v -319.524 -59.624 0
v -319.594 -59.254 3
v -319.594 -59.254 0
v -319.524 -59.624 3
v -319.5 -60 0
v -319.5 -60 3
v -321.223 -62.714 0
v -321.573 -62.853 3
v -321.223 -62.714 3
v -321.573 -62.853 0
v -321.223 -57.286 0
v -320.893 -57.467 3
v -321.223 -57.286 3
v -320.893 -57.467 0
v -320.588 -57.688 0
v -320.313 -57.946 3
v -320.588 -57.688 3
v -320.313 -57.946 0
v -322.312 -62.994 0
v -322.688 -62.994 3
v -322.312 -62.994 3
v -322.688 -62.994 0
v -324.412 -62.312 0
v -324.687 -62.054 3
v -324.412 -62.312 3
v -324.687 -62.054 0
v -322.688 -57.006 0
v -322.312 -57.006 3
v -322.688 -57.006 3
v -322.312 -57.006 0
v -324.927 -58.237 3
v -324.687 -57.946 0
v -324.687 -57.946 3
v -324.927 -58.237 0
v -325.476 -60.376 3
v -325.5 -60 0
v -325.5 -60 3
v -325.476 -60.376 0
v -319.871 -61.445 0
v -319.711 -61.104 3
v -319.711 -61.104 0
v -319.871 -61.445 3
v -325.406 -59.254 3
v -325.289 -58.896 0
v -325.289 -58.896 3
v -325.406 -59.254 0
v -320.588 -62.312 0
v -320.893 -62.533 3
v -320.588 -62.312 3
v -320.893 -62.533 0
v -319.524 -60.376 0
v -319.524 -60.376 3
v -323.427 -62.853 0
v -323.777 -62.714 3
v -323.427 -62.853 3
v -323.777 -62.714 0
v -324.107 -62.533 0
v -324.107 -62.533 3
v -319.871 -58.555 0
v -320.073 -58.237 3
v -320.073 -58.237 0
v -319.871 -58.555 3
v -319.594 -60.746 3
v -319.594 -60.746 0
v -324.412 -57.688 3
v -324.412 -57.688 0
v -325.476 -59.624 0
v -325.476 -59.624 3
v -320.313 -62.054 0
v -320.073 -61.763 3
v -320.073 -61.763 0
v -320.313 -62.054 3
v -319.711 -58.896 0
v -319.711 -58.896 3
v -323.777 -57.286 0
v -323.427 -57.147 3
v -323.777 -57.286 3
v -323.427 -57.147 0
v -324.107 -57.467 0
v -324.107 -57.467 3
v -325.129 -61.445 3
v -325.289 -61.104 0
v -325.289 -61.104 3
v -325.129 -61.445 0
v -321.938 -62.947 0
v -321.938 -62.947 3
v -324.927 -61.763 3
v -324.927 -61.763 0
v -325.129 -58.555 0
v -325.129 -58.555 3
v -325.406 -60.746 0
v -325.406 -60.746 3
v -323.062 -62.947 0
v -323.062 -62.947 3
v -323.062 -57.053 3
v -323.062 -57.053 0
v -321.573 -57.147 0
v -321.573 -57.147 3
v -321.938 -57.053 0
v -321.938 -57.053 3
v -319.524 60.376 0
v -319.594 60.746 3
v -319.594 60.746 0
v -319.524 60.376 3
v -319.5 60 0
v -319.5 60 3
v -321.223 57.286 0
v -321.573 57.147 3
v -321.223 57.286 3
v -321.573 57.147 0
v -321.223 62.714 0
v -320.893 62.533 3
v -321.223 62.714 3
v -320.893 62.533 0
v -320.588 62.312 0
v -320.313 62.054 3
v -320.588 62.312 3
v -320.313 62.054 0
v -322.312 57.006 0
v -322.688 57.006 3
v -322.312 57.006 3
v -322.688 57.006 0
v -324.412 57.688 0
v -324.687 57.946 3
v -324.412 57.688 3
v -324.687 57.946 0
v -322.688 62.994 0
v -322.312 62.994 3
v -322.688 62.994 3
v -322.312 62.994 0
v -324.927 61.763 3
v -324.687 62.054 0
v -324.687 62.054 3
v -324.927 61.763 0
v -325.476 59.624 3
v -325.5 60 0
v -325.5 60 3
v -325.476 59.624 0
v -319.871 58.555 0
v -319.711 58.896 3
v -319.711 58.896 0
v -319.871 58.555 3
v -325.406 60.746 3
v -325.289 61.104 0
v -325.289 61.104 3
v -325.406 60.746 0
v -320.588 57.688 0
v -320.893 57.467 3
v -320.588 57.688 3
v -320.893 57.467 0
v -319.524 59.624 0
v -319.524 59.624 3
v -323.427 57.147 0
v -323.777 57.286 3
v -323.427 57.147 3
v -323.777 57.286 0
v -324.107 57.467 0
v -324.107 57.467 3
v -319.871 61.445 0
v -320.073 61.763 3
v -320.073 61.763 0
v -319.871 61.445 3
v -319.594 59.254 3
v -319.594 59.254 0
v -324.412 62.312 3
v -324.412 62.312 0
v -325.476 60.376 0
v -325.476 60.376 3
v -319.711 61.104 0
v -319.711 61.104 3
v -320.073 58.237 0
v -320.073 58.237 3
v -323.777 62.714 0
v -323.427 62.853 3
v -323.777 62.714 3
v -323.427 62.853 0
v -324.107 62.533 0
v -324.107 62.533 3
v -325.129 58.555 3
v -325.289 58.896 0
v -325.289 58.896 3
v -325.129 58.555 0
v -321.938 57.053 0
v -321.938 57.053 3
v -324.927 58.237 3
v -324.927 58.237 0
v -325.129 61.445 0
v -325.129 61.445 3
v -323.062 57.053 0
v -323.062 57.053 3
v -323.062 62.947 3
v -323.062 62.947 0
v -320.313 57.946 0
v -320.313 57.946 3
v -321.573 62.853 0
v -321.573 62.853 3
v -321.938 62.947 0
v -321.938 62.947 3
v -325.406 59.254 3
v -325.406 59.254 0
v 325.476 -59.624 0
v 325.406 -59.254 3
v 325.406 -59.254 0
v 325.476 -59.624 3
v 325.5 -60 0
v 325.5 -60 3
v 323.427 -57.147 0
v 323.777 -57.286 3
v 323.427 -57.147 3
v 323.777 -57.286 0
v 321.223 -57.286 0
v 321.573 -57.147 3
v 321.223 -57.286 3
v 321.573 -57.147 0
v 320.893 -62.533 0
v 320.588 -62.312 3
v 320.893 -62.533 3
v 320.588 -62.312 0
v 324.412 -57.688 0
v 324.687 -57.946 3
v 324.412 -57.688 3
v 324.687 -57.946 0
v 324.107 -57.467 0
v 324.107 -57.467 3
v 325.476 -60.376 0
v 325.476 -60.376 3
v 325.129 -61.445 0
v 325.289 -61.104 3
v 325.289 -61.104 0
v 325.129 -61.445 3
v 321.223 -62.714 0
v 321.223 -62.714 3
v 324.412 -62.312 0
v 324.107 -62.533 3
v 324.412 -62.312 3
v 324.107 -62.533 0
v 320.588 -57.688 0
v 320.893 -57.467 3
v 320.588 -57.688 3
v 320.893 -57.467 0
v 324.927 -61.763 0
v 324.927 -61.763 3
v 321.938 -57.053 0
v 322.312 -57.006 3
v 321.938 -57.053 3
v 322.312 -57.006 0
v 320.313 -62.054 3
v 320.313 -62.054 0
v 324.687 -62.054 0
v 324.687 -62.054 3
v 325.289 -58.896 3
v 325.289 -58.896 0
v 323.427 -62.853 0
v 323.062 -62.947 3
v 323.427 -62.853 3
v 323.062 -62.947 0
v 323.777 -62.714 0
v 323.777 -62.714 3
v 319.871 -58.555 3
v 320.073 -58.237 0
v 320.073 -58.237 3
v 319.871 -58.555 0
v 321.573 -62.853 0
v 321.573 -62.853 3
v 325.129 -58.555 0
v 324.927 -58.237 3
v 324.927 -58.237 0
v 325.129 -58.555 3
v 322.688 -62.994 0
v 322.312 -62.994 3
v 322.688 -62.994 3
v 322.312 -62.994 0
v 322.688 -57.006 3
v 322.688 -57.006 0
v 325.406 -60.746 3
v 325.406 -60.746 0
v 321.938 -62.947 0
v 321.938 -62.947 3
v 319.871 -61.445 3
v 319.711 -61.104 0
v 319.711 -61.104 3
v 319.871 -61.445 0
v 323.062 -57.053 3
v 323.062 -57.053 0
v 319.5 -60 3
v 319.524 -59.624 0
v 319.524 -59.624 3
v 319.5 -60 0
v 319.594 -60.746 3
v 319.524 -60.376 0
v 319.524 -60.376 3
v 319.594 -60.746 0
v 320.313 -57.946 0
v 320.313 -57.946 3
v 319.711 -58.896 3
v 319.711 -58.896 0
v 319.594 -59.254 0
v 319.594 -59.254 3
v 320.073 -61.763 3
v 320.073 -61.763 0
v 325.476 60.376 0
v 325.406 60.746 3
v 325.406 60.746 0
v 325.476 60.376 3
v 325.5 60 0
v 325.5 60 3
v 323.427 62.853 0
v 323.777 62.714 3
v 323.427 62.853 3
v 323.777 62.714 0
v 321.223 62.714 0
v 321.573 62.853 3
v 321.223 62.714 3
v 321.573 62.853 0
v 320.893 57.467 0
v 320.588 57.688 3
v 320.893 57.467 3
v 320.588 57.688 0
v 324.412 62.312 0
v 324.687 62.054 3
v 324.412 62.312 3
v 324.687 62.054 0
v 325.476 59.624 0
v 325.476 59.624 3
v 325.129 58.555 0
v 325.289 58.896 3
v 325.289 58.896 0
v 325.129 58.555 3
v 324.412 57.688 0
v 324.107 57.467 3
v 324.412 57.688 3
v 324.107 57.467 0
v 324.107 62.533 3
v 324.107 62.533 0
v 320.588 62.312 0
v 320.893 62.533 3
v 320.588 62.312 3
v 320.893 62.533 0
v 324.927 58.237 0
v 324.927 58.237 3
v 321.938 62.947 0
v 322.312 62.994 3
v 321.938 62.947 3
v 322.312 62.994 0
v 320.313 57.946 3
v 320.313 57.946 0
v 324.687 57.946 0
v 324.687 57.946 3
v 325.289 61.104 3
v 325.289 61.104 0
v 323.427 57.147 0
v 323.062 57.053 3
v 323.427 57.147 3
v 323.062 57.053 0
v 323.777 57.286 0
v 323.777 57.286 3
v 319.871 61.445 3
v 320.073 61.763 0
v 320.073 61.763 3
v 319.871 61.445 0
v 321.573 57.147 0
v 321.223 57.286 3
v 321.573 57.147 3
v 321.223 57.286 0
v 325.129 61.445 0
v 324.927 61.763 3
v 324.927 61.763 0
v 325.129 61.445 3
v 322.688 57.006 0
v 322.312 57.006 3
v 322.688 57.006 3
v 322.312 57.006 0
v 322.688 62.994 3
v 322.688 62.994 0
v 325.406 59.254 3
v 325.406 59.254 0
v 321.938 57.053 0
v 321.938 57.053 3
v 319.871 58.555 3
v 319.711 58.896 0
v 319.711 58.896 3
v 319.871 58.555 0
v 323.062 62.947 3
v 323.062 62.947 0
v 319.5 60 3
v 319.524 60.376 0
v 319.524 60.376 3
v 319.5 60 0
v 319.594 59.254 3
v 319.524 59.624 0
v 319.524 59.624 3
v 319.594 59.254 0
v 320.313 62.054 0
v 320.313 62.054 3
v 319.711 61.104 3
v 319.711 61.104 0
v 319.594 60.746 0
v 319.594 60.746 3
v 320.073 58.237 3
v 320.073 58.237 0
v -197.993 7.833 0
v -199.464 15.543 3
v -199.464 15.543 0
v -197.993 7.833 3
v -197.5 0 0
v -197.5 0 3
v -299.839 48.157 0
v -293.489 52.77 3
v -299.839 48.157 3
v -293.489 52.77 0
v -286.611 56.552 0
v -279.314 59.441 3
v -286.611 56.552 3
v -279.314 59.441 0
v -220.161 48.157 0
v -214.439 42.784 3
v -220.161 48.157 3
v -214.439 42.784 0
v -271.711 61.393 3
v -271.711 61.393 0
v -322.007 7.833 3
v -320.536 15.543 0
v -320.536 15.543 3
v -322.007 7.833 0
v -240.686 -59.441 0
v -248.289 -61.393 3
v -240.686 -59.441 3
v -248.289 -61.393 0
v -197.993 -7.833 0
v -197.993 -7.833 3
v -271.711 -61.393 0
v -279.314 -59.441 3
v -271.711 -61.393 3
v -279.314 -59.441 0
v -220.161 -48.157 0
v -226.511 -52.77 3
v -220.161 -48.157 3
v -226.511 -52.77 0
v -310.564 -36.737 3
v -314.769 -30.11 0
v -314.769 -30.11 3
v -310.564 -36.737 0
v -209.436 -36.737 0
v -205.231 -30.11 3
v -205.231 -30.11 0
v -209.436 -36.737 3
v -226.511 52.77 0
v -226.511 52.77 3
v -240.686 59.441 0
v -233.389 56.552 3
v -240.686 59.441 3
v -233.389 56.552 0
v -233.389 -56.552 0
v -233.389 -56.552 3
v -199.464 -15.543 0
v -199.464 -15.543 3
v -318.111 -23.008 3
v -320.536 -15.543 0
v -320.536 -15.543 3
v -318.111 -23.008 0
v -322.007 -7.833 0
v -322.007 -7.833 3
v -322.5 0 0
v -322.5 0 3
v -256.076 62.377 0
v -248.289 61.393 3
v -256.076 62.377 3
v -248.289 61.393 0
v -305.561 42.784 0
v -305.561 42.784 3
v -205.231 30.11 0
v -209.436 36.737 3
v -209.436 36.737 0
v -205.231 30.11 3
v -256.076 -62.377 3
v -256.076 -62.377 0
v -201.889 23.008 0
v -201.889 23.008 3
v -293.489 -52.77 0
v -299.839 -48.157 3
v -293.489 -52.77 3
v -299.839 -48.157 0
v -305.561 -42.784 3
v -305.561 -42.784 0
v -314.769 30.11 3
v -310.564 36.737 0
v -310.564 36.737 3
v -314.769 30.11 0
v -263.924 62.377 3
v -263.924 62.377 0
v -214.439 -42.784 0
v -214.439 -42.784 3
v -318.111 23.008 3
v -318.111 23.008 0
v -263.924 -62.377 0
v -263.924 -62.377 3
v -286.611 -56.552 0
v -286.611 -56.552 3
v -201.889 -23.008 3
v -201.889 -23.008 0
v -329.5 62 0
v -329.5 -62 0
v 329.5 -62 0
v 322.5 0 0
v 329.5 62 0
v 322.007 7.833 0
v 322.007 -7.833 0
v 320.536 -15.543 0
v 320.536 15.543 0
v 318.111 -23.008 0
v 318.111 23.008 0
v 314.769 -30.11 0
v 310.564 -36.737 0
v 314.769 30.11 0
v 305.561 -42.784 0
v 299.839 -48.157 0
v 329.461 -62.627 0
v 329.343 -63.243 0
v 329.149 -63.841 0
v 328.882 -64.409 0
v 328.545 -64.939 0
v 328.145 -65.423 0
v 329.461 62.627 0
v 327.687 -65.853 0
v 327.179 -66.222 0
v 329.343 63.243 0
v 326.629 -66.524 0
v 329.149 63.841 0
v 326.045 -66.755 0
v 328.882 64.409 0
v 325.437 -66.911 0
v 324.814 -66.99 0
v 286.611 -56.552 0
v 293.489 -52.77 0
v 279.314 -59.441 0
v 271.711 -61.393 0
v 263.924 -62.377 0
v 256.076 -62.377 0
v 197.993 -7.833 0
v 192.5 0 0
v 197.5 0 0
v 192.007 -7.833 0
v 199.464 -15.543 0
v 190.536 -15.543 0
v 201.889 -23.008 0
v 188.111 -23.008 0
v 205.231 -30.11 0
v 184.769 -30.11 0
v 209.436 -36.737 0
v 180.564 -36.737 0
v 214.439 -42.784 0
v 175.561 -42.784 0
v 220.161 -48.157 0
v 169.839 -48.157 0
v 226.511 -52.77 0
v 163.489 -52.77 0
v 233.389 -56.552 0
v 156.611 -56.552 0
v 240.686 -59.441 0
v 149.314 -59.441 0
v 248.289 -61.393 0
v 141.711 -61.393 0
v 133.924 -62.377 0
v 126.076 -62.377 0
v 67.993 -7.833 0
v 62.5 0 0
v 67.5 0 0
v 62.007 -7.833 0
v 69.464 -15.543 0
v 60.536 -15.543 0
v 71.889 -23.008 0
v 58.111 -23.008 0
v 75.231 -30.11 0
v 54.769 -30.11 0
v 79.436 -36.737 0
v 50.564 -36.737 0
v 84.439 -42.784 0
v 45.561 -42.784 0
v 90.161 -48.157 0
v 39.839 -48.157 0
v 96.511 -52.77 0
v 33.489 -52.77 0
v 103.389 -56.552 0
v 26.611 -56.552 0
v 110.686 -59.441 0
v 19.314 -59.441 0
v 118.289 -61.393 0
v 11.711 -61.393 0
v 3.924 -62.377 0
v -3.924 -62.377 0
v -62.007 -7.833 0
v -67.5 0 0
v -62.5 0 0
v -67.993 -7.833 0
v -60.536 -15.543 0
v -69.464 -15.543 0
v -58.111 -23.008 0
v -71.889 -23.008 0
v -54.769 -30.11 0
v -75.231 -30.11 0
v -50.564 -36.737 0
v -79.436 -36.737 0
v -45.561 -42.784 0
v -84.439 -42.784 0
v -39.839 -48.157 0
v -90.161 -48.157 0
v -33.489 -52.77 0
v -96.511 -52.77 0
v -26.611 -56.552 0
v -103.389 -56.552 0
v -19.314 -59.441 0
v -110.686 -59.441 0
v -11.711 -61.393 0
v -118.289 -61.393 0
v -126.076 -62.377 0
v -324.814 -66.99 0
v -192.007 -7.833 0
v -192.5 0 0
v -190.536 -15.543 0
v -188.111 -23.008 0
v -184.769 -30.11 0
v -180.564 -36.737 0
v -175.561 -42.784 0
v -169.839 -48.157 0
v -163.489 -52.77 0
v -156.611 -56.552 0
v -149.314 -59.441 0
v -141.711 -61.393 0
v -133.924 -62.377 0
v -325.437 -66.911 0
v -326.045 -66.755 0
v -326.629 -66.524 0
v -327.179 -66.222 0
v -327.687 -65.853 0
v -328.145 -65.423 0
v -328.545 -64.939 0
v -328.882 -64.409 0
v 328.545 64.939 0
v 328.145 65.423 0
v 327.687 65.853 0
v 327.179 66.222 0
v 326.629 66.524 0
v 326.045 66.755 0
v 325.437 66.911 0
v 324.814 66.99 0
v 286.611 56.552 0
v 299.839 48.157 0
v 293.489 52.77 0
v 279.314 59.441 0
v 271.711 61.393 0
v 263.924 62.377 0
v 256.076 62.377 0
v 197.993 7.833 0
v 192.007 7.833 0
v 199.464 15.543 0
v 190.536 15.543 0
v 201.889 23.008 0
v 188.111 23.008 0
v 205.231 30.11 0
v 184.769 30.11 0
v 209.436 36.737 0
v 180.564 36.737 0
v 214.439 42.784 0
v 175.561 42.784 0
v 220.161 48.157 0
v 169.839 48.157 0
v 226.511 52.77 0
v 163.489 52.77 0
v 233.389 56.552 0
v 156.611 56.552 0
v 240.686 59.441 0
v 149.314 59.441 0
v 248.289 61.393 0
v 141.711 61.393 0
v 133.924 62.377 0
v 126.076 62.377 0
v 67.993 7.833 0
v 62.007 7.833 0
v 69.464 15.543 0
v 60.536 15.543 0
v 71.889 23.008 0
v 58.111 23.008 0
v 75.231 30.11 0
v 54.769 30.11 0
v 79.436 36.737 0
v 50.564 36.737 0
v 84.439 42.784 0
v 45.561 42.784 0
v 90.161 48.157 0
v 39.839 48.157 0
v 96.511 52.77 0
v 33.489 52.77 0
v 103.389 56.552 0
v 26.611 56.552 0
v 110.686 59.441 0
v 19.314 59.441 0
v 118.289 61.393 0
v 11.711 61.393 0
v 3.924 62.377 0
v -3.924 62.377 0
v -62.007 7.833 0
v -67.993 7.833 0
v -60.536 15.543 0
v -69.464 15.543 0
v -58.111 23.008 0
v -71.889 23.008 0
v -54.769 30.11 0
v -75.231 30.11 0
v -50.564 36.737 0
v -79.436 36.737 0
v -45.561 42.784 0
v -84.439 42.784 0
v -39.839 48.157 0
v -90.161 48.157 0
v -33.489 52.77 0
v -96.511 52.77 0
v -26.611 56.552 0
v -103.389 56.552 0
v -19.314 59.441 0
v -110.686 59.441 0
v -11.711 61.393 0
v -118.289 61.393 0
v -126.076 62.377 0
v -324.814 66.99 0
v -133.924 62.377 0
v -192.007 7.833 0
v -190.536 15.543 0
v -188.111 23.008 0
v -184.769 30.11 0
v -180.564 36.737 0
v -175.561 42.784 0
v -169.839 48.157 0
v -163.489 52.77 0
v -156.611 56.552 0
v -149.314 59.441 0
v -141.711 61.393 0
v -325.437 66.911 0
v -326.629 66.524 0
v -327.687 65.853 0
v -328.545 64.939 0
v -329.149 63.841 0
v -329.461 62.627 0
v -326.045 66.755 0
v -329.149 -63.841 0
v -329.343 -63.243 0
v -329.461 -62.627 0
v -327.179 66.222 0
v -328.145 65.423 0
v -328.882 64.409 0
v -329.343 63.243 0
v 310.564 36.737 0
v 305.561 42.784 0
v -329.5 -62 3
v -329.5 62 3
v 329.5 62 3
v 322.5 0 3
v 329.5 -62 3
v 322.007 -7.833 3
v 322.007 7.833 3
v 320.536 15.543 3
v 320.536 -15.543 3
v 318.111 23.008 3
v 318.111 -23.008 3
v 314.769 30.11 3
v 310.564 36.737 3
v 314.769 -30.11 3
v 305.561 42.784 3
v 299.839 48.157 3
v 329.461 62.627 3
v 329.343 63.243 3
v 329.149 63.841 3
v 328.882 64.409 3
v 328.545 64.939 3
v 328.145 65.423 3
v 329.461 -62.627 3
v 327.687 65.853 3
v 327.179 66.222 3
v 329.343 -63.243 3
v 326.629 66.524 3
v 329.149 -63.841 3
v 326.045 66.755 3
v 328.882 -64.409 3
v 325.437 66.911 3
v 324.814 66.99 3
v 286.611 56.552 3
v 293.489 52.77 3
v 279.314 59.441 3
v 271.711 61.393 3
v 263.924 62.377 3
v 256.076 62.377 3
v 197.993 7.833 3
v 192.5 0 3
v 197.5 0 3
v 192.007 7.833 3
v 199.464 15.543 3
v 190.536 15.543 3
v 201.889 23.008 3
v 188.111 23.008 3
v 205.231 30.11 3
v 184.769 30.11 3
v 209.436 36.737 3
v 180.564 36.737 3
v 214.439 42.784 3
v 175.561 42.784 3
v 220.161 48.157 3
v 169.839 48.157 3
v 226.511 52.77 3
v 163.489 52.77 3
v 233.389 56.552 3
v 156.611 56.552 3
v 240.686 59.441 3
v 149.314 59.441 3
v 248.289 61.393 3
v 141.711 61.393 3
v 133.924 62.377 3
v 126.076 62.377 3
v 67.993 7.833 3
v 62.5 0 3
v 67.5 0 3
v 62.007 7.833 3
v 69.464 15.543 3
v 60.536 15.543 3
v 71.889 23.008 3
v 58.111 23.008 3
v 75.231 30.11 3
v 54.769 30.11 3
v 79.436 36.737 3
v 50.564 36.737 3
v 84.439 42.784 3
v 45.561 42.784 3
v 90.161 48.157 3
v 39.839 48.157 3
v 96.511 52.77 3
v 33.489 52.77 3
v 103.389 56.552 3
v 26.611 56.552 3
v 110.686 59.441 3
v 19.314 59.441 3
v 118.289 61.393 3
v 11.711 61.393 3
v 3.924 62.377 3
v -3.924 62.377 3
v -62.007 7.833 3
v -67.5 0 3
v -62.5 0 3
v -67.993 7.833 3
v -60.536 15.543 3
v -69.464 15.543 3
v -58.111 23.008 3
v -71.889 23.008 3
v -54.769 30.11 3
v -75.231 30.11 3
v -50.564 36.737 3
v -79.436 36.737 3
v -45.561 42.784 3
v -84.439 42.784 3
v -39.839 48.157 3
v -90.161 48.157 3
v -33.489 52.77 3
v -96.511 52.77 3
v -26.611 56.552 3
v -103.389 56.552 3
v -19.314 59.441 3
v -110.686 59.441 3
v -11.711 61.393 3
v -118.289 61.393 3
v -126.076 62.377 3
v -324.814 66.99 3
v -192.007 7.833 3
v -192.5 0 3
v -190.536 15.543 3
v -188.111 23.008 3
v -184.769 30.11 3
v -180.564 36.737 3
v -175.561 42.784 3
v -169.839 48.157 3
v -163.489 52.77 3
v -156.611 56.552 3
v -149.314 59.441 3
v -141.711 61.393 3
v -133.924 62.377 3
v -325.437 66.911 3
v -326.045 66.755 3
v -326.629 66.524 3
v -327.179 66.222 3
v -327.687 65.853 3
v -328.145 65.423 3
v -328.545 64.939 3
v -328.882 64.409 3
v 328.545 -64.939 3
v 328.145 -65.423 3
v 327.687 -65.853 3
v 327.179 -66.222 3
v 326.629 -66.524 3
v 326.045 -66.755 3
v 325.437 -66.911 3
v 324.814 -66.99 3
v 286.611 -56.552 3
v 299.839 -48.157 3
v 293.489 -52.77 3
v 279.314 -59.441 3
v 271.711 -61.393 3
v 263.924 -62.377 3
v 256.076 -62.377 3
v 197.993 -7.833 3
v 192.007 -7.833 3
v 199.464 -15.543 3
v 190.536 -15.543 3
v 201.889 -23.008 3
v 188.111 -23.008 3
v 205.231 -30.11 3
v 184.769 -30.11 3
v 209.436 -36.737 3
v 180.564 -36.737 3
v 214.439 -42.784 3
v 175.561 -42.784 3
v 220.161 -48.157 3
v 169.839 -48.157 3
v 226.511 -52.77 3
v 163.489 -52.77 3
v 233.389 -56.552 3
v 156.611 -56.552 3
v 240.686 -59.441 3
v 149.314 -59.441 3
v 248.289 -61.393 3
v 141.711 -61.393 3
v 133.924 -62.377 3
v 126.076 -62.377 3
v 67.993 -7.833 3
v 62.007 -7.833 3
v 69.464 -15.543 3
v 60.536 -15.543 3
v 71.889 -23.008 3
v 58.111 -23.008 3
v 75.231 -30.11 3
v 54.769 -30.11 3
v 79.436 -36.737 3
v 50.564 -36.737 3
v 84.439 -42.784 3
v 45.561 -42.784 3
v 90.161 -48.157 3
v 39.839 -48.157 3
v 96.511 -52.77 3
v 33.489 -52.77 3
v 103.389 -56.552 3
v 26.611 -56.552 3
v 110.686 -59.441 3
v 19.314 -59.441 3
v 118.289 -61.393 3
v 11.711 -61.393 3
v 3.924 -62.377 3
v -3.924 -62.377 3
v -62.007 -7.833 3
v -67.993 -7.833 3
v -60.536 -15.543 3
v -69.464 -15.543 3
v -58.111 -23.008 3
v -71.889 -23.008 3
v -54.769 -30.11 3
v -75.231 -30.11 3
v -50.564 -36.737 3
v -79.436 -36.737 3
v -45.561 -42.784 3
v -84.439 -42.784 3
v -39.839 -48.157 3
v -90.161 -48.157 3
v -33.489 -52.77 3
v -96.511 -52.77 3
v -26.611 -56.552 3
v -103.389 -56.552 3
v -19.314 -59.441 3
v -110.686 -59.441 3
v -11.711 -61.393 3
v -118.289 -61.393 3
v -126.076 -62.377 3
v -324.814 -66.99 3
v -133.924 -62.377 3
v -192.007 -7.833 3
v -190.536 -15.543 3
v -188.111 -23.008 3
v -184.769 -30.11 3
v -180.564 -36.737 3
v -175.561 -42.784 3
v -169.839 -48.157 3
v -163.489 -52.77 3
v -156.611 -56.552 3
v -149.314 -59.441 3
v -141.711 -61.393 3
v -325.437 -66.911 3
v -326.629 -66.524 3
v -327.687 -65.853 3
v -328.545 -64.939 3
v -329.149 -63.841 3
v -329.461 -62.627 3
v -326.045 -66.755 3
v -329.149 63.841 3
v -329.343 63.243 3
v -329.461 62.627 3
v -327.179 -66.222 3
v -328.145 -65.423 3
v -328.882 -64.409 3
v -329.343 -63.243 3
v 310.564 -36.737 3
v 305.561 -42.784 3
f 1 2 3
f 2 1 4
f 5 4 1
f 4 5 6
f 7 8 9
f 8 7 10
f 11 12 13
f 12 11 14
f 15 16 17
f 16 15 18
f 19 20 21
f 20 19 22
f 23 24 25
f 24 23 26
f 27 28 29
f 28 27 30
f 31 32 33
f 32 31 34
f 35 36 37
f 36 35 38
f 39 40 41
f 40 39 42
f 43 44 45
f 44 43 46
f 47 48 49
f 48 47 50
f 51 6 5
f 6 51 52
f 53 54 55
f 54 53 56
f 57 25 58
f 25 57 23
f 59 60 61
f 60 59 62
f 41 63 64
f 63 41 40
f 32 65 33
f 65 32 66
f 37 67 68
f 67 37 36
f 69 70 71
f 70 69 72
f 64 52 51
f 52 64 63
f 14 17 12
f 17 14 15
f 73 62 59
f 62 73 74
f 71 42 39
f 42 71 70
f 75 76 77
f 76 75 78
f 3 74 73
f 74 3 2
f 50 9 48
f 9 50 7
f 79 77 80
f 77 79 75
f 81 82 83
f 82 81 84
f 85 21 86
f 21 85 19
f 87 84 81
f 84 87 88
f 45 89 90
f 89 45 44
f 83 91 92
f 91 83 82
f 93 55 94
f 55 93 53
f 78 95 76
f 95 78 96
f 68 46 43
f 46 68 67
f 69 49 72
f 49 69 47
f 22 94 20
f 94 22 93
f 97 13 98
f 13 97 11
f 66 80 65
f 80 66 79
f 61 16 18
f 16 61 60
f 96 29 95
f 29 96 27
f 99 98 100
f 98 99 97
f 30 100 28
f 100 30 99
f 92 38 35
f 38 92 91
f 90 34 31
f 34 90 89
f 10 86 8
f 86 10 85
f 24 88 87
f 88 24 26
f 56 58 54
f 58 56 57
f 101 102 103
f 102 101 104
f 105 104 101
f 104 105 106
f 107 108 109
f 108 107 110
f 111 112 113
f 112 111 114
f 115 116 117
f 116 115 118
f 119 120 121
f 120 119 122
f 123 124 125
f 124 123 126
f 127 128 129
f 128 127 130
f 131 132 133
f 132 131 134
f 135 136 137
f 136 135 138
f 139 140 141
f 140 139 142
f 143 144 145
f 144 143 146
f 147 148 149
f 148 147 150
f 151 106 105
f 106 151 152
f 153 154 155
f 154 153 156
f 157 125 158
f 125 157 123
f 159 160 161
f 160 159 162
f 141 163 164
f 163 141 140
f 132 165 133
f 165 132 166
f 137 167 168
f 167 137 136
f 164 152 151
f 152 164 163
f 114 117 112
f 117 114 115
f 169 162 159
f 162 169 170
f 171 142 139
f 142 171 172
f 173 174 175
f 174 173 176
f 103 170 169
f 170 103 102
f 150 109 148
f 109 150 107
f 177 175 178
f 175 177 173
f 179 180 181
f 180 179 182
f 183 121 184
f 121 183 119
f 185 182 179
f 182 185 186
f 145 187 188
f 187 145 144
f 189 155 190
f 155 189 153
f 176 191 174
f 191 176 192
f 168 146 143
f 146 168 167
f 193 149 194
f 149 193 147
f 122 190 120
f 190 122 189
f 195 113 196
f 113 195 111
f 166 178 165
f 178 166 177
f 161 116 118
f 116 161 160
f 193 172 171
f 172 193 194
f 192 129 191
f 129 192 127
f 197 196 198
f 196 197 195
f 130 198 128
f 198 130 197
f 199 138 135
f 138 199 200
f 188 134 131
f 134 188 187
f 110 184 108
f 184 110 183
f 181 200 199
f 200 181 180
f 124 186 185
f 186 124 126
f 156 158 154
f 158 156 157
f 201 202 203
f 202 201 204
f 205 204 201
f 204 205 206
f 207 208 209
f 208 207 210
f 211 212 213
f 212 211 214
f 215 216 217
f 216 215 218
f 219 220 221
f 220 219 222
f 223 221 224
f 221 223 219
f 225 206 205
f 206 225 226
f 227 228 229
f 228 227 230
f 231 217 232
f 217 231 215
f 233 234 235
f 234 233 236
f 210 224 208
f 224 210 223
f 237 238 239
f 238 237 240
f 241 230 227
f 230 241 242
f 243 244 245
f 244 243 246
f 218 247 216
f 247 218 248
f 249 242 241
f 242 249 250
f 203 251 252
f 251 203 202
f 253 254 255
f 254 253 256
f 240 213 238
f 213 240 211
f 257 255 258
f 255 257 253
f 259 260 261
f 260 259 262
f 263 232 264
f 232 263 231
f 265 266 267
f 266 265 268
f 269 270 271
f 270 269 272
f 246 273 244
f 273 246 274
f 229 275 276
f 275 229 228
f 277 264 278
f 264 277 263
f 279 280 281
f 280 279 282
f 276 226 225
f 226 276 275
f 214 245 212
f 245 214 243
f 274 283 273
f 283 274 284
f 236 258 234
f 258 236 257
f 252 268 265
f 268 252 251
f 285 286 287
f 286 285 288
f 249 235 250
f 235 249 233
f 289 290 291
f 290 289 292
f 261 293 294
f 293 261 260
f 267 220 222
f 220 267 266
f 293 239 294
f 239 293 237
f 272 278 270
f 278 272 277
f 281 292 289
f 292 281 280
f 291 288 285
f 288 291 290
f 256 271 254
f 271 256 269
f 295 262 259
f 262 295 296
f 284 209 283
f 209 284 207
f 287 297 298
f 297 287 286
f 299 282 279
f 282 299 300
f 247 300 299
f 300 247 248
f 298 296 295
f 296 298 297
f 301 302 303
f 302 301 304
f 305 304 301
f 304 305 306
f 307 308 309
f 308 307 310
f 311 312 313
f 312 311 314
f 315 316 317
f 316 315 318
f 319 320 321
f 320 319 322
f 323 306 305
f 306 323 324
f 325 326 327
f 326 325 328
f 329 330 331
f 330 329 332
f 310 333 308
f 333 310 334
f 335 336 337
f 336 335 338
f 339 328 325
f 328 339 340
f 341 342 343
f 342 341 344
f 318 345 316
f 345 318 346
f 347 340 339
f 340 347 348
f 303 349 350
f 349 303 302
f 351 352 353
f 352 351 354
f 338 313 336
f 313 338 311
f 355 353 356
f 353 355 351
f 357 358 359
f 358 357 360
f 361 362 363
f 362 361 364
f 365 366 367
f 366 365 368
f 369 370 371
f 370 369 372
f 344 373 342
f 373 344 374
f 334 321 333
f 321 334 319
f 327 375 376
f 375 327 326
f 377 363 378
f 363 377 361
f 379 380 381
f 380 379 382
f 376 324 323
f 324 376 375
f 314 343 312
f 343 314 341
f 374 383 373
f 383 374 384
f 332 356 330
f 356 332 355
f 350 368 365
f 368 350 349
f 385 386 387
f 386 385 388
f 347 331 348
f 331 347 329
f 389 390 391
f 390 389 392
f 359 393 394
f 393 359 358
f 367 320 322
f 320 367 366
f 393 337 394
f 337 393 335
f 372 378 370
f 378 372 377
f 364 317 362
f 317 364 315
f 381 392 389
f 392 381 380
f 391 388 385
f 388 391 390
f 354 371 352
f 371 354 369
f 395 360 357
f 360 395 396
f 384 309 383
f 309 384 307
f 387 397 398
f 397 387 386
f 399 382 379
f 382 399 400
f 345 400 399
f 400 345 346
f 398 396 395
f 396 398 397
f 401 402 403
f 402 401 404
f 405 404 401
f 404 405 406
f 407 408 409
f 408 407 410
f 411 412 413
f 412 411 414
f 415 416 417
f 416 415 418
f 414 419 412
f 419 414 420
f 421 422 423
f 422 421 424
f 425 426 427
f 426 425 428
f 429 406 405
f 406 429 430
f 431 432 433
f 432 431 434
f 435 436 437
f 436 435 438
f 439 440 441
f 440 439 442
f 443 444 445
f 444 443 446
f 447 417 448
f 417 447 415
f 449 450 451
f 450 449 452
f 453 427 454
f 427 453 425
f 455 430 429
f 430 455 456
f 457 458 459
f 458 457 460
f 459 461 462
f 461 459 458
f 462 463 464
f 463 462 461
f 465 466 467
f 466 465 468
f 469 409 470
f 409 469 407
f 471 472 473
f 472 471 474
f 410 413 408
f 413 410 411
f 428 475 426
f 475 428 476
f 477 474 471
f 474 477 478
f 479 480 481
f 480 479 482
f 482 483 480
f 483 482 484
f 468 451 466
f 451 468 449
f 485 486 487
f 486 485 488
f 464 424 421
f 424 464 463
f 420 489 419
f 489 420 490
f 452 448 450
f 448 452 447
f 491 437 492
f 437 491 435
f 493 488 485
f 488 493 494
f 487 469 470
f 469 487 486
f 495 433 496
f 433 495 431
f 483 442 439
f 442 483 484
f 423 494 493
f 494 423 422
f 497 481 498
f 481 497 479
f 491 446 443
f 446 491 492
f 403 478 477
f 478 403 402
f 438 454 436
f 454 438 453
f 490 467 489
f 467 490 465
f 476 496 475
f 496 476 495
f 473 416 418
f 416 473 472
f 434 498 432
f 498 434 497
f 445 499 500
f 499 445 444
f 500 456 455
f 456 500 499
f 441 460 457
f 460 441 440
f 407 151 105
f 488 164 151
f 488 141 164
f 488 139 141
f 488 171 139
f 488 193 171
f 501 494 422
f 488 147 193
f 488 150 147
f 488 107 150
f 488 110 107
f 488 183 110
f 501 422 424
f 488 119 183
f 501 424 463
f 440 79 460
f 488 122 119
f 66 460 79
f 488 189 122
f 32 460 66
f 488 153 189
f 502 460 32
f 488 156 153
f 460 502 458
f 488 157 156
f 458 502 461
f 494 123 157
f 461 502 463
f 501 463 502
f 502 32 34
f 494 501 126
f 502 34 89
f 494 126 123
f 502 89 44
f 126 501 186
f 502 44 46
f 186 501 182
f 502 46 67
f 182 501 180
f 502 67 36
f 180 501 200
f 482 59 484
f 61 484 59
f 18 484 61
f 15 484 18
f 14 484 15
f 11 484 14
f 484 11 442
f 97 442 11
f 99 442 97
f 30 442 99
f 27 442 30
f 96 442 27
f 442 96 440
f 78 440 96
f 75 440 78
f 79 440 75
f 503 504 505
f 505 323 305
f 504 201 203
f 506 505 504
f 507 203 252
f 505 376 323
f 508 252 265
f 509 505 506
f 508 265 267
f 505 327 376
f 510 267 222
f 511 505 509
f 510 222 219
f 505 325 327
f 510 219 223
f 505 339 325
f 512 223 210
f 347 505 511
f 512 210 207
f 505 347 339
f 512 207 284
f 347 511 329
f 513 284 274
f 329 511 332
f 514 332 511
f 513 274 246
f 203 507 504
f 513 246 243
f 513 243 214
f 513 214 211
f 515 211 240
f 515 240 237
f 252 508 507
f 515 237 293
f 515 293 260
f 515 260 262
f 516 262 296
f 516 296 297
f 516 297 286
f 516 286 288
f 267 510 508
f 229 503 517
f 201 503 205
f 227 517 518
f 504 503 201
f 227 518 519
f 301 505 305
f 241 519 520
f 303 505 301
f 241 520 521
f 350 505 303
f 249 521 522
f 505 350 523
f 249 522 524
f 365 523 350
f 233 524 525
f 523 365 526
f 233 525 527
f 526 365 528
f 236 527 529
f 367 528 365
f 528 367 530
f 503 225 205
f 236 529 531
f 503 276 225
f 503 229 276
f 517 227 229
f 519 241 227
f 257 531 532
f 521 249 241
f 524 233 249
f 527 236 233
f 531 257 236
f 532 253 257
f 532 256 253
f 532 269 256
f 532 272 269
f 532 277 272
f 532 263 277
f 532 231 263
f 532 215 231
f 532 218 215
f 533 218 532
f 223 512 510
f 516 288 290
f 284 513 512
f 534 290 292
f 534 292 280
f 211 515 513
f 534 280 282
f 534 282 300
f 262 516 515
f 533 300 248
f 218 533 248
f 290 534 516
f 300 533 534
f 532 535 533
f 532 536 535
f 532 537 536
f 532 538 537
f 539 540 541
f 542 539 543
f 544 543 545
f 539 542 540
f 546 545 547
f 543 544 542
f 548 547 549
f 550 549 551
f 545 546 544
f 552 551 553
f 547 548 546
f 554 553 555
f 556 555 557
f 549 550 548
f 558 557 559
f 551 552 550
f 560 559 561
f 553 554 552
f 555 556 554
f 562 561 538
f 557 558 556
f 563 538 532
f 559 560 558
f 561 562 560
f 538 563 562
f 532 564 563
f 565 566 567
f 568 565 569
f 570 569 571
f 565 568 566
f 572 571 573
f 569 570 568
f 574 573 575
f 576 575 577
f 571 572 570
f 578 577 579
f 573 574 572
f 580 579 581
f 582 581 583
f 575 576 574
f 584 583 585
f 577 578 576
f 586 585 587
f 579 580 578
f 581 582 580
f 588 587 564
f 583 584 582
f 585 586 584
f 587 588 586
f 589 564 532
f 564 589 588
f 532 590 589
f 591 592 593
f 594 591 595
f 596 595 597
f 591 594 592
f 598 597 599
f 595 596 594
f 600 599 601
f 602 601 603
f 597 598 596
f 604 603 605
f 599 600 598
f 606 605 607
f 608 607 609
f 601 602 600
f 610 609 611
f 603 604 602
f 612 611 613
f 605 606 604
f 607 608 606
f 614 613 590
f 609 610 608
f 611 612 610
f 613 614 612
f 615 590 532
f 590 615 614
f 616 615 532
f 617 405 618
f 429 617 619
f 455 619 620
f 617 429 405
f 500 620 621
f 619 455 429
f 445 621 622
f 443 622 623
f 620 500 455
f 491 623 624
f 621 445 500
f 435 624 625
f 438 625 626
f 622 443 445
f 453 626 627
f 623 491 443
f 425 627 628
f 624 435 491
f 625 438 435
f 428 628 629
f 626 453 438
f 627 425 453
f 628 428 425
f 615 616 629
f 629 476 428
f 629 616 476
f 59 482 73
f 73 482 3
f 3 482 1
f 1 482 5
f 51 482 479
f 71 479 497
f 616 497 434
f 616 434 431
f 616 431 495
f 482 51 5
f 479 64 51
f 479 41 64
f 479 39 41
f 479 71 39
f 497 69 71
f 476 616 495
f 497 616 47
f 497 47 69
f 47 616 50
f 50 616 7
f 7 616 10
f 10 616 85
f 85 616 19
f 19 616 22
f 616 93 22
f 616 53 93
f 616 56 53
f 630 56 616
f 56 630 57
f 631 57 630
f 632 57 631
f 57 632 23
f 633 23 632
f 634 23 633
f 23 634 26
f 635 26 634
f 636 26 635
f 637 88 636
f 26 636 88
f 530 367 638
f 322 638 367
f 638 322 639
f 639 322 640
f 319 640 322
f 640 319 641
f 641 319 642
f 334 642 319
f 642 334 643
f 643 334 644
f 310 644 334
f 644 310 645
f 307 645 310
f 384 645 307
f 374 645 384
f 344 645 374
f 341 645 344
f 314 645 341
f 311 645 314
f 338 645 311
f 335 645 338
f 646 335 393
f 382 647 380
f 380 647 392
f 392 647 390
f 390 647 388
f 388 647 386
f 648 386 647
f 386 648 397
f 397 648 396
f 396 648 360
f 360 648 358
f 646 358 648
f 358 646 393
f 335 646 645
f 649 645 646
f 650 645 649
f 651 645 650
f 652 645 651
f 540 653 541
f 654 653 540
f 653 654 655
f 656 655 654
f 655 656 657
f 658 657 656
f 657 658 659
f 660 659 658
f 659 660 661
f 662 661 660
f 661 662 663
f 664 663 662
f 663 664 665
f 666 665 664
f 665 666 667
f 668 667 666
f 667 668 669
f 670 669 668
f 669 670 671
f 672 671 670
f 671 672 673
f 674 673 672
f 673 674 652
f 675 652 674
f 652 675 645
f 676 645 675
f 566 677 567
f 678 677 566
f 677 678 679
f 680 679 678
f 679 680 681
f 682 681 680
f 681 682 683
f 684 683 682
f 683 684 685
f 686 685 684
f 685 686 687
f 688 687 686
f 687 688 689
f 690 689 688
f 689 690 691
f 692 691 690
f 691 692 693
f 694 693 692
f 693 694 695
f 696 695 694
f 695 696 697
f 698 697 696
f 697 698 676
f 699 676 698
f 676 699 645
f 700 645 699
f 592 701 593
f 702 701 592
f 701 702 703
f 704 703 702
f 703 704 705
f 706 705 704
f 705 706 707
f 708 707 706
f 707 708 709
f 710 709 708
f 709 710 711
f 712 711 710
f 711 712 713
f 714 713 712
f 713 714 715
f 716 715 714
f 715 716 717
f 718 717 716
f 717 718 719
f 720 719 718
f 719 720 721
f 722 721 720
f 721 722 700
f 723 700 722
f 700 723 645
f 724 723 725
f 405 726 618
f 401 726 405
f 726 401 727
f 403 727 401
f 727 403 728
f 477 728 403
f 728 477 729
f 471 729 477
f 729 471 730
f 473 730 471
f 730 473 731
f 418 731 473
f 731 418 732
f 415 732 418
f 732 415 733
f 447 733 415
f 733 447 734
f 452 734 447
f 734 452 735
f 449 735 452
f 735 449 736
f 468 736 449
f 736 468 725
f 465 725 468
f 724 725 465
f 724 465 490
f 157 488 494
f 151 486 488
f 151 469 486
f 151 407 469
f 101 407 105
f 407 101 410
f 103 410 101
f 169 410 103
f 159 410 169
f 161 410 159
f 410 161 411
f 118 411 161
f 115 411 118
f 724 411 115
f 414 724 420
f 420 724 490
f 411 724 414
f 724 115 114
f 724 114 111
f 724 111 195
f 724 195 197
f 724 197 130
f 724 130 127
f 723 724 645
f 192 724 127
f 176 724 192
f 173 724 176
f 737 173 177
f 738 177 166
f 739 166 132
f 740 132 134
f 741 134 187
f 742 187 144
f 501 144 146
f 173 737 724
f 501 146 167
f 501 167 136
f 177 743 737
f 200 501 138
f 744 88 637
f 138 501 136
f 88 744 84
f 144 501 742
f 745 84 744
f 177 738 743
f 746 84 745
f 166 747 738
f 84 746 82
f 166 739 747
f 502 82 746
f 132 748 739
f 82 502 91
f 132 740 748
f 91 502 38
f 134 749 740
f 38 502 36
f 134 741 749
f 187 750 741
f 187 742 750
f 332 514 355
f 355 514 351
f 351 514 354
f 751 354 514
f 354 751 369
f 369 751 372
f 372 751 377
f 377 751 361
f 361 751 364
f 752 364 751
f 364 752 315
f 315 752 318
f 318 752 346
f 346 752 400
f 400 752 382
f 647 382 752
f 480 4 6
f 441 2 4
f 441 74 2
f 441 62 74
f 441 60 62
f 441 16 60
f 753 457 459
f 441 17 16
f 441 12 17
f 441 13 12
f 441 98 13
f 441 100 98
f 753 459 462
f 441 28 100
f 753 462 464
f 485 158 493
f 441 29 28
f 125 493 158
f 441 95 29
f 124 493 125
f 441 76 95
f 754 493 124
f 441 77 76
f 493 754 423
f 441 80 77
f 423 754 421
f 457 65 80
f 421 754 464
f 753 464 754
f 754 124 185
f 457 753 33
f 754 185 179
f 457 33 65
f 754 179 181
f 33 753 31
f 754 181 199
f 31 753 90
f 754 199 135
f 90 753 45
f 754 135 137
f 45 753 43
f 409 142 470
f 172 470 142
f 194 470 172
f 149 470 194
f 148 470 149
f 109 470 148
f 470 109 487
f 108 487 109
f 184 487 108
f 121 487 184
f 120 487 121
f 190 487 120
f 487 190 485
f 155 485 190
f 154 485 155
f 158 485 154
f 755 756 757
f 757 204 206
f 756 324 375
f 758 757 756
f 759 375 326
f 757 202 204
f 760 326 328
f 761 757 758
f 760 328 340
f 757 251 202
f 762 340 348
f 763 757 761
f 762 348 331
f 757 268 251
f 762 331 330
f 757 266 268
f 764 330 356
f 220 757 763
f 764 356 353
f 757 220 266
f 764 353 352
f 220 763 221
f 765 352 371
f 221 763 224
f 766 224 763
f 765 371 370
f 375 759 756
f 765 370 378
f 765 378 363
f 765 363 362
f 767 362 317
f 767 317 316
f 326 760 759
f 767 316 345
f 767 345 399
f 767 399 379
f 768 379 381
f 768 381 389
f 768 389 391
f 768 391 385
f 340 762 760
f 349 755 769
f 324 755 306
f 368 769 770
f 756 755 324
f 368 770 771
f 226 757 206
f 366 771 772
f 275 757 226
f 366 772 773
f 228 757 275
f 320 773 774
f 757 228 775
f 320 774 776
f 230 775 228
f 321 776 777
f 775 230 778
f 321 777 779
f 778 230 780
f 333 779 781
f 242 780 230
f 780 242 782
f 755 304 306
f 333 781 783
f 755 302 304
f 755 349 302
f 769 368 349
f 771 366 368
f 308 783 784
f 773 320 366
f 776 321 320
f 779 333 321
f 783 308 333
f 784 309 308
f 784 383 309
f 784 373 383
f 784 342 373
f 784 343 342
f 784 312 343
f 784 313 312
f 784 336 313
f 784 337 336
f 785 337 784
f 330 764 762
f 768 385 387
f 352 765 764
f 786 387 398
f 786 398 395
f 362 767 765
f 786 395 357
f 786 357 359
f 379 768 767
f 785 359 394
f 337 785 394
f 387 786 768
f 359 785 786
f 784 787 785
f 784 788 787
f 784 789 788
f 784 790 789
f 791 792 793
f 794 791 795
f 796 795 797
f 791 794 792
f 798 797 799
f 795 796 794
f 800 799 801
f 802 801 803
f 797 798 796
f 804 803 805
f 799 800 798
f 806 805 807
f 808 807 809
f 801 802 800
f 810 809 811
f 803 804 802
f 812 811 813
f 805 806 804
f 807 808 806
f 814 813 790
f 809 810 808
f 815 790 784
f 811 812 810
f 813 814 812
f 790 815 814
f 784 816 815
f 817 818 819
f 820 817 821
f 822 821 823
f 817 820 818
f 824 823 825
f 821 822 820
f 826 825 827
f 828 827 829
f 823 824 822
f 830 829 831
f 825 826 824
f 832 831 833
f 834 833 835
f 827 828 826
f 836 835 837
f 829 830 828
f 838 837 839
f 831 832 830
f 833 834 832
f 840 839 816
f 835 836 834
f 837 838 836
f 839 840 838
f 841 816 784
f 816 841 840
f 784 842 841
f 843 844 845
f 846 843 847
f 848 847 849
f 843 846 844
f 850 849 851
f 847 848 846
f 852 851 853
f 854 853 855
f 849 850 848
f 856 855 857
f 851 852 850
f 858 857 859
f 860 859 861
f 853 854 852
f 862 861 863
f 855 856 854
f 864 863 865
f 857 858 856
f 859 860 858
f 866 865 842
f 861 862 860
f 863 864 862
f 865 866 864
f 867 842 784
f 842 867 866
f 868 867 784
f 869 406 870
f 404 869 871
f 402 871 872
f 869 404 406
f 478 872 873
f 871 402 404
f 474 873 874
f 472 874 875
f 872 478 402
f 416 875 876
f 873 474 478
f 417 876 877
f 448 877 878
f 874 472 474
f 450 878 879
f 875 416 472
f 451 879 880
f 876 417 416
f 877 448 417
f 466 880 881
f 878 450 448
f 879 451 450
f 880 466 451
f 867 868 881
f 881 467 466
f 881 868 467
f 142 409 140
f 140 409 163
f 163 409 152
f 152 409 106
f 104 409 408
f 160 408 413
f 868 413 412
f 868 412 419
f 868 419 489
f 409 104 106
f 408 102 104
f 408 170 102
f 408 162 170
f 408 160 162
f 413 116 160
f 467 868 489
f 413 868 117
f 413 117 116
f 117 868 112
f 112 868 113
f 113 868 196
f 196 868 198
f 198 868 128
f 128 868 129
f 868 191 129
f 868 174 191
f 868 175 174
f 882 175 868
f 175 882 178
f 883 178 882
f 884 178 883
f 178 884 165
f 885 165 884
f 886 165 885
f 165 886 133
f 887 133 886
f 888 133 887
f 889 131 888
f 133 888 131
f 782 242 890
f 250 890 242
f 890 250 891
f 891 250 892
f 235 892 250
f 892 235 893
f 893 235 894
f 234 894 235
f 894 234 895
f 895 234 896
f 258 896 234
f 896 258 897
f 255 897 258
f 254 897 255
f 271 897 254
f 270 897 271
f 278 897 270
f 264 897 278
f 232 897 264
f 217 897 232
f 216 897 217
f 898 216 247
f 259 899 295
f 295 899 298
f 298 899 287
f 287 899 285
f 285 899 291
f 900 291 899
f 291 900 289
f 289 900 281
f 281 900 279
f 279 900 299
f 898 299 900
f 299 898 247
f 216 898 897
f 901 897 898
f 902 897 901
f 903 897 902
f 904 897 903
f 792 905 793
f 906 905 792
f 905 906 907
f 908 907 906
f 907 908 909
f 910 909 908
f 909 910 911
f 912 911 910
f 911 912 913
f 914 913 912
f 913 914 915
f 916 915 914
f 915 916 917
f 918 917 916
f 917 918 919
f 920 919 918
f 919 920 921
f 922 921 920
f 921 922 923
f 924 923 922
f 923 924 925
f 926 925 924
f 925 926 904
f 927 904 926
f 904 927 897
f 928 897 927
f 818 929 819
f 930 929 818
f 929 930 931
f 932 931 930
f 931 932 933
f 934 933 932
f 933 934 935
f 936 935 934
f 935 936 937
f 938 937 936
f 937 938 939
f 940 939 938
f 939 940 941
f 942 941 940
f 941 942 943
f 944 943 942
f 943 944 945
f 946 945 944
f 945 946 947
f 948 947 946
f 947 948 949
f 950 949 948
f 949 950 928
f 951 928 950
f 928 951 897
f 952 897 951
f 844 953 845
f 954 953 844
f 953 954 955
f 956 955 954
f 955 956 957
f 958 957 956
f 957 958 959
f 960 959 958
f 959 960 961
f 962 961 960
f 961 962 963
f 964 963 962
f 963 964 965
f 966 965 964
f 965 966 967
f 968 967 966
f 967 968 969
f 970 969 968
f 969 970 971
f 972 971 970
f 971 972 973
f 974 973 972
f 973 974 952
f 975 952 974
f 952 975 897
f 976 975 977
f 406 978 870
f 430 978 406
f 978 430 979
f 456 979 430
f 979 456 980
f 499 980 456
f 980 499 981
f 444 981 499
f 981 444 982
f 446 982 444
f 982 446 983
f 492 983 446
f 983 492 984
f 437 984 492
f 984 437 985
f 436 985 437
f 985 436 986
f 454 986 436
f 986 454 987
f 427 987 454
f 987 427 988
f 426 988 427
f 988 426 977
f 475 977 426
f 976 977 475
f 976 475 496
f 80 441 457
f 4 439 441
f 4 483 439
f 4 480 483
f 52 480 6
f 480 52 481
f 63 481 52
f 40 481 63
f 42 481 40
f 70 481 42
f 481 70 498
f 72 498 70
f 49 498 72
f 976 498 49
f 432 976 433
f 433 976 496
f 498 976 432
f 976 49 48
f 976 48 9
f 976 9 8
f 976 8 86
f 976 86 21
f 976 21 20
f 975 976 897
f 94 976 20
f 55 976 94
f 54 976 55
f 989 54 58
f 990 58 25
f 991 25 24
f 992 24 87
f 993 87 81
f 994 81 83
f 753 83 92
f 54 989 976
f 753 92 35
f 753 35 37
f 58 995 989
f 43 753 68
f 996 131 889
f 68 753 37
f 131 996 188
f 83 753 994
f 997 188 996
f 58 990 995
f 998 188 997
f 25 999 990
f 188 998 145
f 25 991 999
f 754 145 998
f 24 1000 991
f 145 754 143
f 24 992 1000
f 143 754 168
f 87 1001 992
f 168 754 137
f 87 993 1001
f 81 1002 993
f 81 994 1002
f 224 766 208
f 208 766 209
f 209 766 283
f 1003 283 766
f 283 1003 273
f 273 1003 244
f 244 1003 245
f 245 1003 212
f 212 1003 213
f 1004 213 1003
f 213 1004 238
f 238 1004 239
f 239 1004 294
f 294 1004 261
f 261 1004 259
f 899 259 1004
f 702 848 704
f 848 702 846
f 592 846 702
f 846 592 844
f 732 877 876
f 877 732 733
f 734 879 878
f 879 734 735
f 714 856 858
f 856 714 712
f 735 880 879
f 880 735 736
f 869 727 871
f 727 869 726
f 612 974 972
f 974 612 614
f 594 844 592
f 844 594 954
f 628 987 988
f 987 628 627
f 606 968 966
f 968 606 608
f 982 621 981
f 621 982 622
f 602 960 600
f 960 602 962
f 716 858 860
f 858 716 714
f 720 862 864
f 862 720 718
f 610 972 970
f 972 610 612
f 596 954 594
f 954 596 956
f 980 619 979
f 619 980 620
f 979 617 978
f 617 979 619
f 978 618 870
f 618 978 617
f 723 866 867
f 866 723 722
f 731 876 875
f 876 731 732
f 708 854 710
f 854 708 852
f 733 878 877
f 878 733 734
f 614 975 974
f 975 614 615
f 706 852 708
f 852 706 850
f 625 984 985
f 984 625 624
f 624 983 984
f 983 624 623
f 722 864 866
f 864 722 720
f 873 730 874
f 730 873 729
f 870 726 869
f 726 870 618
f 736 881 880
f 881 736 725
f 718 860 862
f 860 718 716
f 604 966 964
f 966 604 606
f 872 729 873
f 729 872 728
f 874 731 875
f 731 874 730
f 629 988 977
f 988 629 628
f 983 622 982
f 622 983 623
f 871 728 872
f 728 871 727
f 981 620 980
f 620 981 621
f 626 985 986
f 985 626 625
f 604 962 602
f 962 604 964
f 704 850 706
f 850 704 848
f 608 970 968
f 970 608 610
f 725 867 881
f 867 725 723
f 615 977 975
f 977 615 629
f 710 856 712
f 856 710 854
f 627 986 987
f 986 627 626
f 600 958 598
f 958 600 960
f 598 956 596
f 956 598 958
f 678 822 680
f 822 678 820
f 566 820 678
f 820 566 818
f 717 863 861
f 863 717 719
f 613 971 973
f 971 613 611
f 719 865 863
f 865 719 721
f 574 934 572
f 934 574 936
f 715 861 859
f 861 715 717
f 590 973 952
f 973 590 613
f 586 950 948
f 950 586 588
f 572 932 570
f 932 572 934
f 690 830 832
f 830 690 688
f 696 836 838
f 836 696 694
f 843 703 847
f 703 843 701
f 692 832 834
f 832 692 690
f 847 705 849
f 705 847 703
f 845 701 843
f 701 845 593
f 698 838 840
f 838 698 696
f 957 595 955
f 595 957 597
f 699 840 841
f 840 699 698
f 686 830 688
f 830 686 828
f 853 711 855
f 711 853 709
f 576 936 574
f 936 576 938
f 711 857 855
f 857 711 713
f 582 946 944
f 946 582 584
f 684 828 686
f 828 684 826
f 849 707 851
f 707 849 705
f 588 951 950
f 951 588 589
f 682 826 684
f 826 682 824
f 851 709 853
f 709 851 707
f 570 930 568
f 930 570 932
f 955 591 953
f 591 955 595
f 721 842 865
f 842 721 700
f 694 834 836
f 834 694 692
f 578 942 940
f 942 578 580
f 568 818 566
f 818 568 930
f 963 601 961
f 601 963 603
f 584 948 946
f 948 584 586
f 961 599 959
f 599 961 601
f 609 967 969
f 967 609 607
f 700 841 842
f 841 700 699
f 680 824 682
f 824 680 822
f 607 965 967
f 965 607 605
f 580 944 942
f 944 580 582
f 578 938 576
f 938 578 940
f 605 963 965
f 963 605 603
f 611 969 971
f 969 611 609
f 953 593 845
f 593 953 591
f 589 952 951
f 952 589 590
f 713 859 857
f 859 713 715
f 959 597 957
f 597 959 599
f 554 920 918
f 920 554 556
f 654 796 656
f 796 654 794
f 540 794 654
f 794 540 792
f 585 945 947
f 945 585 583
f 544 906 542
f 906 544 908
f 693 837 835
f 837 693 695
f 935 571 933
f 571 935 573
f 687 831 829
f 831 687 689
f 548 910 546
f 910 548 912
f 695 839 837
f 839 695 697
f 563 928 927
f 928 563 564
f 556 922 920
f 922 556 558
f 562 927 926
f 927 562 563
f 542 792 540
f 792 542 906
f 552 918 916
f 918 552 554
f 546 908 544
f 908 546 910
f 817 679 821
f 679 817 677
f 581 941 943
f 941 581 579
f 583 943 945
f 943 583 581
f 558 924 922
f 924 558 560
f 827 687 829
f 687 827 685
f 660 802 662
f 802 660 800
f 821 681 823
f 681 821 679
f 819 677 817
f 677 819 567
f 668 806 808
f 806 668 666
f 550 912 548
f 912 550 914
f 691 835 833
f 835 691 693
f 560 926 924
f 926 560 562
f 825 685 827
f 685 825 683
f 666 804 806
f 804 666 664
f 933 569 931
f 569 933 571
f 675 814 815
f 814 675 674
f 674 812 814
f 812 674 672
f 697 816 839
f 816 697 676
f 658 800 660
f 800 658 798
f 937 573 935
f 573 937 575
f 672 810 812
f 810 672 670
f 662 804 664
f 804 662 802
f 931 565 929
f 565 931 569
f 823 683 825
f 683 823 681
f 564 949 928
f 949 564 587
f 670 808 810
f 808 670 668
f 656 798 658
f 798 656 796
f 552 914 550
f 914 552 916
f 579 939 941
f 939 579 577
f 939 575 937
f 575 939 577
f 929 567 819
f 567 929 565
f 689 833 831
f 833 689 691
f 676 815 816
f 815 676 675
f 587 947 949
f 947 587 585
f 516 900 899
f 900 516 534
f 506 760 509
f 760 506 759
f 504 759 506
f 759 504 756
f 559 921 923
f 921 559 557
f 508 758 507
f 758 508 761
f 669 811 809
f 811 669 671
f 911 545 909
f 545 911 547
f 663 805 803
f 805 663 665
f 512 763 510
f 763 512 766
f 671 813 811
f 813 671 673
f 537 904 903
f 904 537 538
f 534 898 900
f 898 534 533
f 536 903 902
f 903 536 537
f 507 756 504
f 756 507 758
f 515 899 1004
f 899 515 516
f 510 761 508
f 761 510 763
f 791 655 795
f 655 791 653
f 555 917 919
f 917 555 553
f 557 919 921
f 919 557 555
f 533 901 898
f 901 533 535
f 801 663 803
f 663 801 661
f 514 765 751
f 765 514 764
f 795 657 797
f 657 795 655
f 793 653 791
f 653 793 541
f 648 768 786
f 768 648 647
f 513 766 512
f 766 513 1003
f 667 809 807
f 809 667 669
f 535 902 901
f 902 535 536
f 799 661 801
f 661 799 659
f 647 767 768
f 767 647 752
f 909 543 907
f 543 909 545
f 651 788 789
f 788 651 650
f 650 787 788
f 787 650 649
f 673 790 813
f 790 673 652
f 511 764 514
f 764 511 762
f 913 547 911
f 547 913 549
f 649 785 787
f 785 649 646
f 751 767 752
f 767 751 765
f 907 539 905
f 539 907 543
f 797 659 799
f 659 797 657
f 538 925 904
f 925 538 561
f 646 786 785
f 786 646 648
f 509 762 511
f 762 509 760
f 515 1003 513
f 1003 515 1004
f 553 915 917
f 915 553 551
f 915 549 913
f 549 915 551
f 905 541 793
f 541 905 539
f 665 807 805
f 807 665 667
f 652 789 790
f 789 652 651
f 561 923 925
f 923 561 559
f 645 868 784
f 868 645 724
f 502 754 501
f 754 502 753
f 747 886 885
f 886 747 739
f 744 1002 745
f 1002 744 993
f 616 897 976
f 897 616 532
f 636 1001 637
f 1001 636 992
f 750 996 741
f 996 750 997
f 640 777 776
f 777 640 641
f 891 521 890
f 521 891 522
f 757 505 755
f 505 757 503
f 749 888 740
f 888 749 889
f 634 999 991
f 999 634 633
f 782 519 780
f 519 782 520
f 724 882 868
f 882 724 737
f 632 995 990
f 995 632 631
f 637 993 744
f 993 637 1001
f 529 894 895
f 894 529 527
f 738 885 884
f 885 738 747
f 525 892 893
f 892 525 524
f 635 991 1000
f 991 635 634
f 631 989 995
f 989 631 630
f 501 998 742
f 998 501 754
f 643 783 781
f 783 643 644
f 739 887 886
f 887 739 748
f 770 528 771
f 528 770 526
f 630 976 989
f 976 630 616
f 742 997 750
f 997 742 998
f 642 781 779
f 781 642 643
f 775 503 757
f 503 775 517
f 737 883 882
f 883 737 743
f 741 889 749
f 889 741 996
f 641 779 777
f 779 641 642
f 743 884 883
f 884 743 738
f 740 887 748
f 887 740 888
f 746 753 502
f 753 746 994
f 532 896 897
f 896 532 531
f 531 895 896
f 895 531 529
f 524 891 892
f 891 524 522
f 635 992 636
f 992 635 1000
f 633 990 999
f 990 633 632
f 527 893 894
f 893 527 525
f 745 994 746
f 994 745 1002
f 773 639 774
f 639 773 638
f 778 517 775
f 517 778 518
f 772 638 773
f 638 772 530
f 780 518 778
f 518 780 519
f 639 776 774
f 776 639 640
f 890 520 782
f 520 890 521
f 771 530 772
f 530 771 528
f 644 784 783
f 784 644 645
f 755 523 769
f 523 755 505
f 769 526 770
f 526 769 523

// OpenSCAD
$fn = 50;


difference() {
	union() {
		hull() {
			translate(v = [-324.5000000000, 62.0000000000, 0]) {
				cylinder(h = 3, r = 5);
			}
			translate(v = [324.5000000000, 62.0000000000, 0]) {
				cylinder(h = 3, r = 5);
			}
			translate(v = [-324.5000000000, -62.0000000000, 0]) {
				cylinder(h = 3, r = 5);
			}
			translate(v = [324.5000000000, -62.0000000000, 0]) {
				cylinder(h = 3, r = 5);
			}
		}
	}
	union() {
		#translate(v = [-322.5000000000, -60.0000000000, -100.0000000000]) {
			cylinder(h = 200, r = 3.0000000000);
		}
		#translate(v = [-322.5000000000, 60.0000000000, -100.0000000000]) {
			cylinder(h = 200, r = 3.0000000000);
		}
		#translate(v = [322.5000000000, -60.0000000000, -100.0000000000]) {
			cylinder(h = 200, r = 3.0000000000);
		}
		#translate(v = [322.5000000000, 60.0000000000, -100.0000000000]) {
			cylinder(h = 200, r = 3.0000000000);
		}
		#translate(v = [-260.0000000000, 0, 0]) {
			cylinder(h = 3, r = 62.5000000000);
		}
		#translate(v = [-130.0000000000, 0, 0]) {
			cylinder(h = 3, r = 62.5000000000);
		}
		#cylinder(h = 3, r = 62.5000000000);
		#translate(v = [130.0000000000, 0, 0]) {
			cylinder(h = 3, r = 62.5000000000);
		}
		#translate(v = [260.0000000000, 0, 0]) {
			cylinder(h = 3, r = 62.5000000000);
		}
	}
}
